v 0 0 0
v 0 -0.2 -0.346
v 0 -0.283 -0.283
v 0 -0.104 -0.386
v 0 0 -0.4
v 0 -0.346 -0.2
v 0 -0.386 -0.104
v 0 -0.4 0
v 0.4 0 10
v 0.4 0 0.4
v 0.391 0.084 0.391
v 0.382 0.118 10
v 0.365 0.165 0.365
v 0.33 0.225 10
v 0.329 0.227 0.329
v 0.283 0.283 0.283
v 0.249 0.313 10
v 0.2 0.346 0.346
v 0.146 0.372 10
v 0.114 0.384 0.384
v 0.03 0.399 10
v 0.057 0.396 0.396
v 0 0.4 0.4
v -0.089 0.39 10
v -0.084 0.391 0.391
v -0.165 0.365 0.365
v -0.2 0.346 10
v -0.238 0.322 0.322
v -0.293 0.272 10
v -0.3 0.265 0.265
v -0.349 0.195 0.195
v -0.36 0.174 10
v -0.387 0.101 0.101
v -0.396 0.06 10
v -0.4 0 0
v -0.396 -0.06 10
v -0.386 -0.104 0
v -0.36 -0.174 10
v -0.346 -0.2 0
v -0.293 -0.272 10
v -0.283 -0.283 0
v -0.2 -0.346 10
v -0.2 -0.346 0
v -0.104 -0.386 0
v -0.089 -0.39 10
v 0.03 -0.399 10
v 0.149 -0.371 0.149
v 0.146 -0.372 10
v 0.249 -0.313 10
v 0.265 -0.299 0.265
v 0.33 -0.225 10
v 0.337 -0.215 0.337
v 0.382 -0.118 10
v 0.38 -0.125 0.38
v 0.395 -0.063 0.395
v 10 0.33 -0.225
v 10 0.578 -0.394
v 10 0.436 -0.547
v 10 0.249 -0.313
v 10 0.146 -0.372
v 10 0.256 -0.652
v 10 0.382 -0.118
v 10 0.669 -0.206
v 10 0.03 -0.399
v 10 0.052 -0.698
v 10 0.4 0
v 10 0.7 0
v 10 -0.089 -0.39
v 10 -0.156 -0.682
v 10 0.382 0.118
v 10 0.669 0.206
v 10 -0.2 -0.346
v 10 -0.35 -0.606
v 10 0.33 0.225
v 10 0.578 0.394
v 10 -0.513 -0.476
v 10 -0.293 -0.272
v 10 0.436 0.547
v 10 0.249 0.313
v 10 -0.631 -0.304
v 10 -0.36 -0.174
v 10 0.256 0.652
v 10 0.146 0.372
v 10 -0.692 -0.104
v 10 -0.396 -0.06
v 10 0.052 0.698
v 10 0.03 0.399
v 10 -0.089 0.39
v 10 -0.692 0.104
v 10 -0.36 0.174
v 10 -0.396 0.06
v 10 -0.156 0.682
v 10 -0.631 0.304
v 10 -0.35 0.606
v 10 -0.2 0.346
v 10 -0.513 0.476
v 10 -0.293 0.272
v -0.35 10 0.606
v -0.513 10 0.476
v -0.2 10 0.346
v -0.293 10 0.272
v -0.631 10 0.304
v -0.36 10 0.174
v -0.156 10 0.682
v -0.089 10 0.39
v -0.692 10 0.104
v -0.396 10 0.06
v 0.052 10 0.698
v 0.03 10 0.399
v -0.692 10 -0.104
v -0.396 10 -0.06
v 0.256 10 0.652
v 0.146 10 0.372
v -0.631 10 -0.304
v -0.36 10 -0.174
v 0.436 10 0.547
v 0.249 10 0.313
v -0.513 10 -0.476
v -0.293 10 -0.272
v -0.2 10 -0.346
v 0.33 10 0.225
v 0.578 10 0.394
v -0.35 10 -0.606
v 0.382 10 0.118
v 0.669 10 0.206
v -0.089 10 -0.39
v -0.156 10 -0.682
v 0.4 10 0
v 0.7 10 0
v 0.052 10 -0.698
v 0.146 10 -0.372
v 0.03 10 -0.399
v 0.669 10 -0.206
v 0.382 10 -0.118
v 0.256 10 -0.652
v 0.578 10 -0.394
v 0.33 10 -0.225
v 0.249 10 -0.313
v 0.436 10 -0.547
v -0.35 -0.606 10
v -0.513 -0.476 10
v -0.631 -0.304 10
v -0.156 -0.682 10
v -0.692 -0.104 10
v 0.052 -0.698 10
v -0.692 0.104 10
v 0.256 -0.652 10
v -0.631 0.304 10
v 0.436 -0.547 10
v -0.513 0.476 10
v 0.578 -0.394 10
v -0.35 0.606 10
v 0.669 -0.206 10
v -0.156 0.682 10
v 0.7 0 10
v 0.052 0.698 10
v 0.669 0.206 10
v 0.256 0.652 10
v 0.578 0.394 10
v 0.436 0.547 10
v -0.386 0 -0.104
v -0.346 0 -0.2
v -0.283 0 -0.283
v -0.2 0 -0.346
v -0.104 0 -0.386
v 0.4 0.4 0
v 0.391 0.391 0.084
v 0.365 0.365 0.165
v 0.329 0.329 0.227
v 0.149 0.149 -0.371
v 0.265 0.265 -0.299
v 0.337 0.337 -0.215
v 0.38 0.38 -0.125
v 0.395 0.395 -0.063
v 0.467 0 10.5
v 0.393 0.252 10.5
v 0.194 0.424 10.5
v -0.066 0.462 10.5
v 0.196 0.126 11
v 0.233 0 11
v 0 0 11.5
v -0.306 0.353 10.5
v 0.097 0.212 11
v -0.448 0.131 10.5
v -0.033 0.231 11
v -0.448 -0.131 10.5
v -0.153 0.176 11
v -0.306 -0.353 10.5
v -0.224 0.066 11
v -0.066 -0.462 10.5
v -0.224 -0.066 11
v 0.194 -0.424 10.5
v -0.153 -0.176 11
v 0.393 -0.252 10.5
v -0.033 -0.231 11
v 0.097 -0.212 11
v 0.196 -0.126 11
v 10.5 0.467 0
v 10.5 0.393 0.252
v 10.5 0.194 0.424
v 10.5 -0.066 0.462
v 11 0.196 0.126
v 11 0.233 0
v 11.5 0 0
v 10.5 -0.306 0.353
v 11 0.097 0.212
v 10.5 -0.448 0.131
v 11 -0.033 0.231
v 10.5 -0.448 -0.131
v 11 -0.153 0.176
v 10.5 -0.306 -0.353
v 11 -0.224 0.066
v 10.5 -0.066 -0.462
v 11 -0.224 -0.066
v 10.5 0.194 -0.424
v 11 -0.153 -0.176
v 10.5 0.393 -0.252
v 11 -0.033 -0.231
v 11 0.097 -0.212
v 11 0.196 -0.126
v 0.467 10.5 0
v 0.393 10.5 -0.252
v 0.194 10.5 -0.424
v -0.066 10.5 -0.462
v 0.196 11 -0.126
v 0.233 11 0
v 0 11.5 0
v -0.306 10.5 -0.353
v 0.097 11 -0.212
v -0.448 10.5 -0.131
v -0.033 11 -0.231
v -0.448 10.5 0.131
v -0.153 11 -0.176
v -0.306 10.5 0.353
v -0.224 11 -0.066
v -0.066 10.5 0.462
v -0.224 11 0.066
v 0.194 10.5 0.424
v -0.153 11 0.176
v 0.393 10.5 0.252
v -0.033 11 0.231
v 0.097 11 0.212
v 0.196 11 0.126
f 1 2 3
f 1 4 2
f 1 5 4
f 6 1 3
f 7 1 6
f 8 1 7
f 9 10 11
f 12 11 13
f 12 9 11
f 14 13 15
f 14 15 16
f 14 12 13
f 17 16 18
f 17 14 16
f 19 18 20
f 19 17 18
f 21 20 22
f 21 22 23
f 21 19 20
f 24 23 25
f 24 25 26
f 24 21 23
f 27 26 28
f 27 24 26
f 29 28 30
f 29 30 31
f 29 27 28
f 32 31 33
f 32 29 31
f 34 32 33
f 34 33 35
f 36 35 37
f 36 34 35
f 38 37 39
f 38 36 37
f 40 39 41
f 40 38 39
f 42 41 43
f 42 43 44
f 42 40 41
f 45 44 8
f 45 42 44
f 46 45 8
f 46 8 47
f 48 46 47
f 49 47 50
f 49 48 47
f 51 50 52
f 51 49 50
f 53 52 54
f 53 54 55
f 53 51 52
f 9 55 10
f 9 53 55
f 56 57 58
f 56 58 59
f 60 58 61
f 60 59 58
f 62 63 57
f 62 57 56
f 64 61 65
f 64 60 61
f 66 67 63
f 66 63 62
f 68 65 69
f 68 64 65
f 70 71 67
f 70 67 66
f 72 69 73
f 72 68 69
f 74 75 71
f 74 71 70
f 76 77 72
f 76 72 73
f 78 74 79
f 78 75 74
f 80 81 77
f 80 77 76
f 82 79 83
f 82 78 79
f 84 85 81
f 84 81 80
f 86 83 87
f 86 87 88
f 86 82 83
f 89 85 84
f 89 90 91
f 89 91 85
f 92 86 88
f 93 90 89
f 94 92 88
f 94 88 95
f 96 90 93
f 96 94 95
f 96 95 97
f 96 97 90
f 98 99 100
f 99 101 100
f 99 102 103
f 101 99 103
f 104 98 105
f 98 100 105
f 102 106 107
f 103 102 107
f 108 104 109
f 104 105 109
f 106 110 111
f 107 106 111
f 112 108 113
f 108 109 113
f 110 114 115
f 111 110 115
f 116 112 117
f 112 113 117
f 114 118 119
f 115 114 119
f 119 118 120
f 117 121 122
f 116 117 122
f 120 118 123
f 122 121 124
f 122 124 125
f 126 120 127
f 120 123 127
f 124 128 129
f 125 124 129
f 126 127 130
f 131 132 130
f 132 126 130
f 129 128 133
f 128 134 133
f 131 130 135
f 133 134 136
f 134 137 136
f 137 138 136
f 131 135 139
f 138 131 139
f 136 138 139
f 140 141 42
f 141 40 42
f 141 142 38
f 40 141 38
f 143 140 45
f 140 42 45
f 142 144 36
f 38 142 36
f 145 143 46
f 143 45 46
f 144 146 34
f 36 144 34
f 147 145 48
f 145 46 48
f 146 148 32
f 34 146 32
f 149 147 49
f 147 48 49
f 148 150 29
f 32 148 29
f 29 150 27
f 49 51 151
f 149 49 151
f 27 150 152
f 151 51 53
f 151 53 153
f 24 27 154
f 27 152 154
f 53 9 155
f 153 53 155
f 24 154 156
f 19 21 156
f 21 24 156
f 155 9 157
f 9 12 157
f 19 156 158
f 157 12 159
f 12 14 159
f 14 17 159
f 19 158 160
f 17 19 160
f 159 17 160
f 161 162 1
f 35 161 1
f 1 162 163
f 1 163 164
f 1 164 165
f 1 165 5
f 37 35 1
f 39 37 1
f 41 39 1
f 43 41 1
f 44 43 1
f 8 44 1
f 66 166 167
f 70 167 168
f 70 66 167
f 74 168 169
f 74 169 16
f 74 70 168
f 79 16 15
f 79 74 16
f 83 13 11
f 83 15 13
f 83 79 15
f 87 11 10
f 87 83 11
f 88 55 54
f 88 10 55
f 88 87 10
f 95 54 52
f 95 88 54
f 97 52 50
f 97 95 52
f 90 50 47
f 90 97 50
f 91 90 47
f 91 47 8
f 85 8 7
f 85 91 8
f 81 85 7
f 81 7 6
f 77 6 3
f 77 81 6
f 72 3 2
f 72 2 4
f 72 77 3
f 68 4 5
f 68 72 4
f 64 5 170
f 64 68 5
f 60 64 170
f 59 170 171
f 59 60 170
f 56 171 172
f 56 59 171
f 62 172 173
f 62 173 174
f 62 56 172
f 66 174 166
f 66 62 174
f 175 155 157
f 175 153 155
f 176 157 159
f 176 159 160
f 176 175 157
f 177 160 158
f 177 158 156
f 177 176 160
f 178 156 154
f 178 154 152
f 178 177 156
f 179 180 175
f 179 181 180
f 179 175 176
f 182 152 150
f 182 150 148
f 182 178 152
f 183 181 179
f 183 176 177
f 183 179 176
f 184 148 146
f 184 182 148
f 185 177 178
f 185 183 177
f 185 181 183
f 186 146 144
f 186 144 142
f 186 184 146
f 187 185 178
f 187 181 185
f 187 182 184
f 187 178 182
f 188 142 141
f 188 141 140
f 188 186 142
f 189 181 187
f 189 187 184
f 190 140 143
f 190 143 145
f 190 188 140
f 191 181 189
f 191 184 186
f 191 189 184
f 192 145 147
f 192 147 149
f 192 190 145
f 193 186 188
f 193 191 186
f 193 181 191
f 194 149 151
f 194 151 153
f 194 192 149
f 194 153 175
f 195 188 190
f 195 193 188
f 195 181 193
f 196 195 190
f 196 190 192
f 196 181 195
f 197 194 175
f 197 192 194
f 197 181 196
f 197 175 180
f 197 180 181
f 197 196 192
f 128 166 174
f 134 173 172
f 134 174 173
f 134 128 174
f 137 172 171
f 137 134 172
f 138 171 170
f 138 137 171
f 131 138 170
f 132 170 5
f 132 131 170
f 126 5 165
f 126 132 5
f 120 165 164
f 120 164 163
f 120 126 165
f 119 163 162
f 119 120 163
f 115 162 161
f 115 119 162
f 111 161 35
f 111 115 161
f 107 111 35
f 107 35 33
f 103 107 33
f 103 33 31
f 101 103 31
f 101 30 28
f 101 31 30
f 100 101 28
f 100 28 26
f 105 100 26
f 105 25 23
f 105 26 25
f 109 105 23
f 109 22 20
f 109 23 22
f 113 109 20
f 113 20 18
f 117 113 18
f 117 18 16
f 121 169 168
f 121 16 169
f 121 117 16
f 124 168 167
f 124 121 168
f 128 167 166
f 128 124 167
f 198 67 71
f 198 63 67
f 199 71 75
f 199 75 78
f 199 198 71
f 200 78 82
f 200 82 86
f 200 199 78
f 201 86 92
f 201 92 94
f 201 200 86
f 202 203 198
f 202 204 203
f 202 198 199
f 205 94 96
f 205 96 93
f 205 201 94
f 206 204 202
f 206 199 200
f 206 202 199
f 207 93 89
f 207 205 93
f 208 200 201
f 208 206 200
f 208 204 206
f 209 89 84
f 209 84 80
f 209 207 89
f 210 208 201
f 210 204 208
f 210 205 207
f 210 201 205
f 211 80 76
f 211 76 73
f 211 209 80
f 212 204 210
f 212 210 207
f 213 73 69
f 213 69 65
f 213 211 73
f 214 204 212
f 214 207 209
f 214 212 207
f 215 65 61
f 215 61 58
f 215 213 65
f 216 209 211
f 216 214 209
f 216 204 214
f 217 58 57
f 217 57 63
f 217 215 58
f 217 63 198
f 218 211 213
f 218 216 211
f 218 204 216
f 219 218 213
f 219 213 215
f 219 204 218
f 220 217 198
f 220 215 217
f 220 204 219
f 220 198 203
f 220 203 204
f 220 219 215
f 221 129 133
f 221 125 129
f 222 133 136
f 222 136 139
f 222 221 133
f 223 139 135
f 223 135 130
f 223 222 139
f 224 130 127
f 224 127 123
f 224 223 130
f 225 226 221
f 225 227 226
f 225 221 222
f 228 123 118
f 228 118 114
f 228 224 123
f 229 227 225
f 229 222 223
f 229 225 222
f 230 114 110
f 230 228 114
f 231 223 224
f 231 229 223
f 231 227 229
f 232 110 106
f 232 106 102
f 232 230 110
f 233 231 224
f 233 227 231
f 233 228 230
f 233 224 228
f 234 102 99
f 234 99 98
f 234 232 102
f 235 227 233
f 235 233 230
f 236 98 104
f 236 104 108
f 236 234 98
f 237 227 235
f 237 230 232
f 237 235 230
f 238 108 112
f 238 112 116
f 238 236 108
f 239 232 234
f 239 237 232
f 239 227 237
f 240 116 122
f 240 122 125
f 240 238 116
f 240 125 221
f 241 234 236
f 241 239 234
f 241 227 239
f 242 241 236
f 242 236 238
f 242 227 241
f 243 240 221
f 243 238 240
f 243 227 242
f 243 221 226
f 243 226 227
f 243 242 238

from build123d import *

# Parameters (mm, degrees)
SKETCH4_R         = 0.4
SKETCH5_R         = 0.7
CIRPATTERN2_COUNT = 2
CIRPATTERN2_ANGLE = 90


# Read off the part's stored shape, not the designer's step: CirPattern1
with BuildPart() as part:
    # Sweep1: sweep along a path in Sketch2
    with BuildLine(Plane(origin=(0, 0, 0), x_dir=(1, 0, 0), z_dir=(0, 1, 0))) as sweep1_path:
        Line((0, 0), (0, -10))
    # Sketch4 → Sweep1 (sweep)
    with BuildSketch(Plane.XY):
        Circle(SKETCH4_R)
    sweep1 = sweep(path=sweep1_path.line)

    # Sketch5 → Loft1 section 0
    with BuildSketch(Plane.XY.offset(10), mode=Mode.PRIVATE) as loft1_s0:
        Circle(SKETCH5_R)
    loft1 = loft([loft1_s0.sketch, Vertex(0, 0, 11.5)])

    # CirPattern1 outline → CirPattern1 (revolve)
    with BuildSketch(Plane.YX):
        Polygon((0.7, 10), (0, 11.5), (0, 0), (0.4, 0), (0.4, 10), align=None)
    revolve(axis=Axis((0, 0, 0), (1, 0, 0)))

    # CirPattern2: Sweep1, Loft1 ×2 about axis
    cirpattern2_axis = Axis((0, 0, 0), (-1, 0, 0))
    add([sweep1.rotate(cirpattern2_axis, i * CIRPATTERN2_ANGLE / (CIRPATTERN2_COUNT - 1)) for i in range(1, CIRPATTERN2_COUNT)])
    add([loft1.rotate(cirpattern2_axis, i * CIRPATTERN2_ANGLE / (CIRPATTERN2_COUNT - 1)) for i in range(1, CIRPATTERN2_COUNT)])


solid = part.part
